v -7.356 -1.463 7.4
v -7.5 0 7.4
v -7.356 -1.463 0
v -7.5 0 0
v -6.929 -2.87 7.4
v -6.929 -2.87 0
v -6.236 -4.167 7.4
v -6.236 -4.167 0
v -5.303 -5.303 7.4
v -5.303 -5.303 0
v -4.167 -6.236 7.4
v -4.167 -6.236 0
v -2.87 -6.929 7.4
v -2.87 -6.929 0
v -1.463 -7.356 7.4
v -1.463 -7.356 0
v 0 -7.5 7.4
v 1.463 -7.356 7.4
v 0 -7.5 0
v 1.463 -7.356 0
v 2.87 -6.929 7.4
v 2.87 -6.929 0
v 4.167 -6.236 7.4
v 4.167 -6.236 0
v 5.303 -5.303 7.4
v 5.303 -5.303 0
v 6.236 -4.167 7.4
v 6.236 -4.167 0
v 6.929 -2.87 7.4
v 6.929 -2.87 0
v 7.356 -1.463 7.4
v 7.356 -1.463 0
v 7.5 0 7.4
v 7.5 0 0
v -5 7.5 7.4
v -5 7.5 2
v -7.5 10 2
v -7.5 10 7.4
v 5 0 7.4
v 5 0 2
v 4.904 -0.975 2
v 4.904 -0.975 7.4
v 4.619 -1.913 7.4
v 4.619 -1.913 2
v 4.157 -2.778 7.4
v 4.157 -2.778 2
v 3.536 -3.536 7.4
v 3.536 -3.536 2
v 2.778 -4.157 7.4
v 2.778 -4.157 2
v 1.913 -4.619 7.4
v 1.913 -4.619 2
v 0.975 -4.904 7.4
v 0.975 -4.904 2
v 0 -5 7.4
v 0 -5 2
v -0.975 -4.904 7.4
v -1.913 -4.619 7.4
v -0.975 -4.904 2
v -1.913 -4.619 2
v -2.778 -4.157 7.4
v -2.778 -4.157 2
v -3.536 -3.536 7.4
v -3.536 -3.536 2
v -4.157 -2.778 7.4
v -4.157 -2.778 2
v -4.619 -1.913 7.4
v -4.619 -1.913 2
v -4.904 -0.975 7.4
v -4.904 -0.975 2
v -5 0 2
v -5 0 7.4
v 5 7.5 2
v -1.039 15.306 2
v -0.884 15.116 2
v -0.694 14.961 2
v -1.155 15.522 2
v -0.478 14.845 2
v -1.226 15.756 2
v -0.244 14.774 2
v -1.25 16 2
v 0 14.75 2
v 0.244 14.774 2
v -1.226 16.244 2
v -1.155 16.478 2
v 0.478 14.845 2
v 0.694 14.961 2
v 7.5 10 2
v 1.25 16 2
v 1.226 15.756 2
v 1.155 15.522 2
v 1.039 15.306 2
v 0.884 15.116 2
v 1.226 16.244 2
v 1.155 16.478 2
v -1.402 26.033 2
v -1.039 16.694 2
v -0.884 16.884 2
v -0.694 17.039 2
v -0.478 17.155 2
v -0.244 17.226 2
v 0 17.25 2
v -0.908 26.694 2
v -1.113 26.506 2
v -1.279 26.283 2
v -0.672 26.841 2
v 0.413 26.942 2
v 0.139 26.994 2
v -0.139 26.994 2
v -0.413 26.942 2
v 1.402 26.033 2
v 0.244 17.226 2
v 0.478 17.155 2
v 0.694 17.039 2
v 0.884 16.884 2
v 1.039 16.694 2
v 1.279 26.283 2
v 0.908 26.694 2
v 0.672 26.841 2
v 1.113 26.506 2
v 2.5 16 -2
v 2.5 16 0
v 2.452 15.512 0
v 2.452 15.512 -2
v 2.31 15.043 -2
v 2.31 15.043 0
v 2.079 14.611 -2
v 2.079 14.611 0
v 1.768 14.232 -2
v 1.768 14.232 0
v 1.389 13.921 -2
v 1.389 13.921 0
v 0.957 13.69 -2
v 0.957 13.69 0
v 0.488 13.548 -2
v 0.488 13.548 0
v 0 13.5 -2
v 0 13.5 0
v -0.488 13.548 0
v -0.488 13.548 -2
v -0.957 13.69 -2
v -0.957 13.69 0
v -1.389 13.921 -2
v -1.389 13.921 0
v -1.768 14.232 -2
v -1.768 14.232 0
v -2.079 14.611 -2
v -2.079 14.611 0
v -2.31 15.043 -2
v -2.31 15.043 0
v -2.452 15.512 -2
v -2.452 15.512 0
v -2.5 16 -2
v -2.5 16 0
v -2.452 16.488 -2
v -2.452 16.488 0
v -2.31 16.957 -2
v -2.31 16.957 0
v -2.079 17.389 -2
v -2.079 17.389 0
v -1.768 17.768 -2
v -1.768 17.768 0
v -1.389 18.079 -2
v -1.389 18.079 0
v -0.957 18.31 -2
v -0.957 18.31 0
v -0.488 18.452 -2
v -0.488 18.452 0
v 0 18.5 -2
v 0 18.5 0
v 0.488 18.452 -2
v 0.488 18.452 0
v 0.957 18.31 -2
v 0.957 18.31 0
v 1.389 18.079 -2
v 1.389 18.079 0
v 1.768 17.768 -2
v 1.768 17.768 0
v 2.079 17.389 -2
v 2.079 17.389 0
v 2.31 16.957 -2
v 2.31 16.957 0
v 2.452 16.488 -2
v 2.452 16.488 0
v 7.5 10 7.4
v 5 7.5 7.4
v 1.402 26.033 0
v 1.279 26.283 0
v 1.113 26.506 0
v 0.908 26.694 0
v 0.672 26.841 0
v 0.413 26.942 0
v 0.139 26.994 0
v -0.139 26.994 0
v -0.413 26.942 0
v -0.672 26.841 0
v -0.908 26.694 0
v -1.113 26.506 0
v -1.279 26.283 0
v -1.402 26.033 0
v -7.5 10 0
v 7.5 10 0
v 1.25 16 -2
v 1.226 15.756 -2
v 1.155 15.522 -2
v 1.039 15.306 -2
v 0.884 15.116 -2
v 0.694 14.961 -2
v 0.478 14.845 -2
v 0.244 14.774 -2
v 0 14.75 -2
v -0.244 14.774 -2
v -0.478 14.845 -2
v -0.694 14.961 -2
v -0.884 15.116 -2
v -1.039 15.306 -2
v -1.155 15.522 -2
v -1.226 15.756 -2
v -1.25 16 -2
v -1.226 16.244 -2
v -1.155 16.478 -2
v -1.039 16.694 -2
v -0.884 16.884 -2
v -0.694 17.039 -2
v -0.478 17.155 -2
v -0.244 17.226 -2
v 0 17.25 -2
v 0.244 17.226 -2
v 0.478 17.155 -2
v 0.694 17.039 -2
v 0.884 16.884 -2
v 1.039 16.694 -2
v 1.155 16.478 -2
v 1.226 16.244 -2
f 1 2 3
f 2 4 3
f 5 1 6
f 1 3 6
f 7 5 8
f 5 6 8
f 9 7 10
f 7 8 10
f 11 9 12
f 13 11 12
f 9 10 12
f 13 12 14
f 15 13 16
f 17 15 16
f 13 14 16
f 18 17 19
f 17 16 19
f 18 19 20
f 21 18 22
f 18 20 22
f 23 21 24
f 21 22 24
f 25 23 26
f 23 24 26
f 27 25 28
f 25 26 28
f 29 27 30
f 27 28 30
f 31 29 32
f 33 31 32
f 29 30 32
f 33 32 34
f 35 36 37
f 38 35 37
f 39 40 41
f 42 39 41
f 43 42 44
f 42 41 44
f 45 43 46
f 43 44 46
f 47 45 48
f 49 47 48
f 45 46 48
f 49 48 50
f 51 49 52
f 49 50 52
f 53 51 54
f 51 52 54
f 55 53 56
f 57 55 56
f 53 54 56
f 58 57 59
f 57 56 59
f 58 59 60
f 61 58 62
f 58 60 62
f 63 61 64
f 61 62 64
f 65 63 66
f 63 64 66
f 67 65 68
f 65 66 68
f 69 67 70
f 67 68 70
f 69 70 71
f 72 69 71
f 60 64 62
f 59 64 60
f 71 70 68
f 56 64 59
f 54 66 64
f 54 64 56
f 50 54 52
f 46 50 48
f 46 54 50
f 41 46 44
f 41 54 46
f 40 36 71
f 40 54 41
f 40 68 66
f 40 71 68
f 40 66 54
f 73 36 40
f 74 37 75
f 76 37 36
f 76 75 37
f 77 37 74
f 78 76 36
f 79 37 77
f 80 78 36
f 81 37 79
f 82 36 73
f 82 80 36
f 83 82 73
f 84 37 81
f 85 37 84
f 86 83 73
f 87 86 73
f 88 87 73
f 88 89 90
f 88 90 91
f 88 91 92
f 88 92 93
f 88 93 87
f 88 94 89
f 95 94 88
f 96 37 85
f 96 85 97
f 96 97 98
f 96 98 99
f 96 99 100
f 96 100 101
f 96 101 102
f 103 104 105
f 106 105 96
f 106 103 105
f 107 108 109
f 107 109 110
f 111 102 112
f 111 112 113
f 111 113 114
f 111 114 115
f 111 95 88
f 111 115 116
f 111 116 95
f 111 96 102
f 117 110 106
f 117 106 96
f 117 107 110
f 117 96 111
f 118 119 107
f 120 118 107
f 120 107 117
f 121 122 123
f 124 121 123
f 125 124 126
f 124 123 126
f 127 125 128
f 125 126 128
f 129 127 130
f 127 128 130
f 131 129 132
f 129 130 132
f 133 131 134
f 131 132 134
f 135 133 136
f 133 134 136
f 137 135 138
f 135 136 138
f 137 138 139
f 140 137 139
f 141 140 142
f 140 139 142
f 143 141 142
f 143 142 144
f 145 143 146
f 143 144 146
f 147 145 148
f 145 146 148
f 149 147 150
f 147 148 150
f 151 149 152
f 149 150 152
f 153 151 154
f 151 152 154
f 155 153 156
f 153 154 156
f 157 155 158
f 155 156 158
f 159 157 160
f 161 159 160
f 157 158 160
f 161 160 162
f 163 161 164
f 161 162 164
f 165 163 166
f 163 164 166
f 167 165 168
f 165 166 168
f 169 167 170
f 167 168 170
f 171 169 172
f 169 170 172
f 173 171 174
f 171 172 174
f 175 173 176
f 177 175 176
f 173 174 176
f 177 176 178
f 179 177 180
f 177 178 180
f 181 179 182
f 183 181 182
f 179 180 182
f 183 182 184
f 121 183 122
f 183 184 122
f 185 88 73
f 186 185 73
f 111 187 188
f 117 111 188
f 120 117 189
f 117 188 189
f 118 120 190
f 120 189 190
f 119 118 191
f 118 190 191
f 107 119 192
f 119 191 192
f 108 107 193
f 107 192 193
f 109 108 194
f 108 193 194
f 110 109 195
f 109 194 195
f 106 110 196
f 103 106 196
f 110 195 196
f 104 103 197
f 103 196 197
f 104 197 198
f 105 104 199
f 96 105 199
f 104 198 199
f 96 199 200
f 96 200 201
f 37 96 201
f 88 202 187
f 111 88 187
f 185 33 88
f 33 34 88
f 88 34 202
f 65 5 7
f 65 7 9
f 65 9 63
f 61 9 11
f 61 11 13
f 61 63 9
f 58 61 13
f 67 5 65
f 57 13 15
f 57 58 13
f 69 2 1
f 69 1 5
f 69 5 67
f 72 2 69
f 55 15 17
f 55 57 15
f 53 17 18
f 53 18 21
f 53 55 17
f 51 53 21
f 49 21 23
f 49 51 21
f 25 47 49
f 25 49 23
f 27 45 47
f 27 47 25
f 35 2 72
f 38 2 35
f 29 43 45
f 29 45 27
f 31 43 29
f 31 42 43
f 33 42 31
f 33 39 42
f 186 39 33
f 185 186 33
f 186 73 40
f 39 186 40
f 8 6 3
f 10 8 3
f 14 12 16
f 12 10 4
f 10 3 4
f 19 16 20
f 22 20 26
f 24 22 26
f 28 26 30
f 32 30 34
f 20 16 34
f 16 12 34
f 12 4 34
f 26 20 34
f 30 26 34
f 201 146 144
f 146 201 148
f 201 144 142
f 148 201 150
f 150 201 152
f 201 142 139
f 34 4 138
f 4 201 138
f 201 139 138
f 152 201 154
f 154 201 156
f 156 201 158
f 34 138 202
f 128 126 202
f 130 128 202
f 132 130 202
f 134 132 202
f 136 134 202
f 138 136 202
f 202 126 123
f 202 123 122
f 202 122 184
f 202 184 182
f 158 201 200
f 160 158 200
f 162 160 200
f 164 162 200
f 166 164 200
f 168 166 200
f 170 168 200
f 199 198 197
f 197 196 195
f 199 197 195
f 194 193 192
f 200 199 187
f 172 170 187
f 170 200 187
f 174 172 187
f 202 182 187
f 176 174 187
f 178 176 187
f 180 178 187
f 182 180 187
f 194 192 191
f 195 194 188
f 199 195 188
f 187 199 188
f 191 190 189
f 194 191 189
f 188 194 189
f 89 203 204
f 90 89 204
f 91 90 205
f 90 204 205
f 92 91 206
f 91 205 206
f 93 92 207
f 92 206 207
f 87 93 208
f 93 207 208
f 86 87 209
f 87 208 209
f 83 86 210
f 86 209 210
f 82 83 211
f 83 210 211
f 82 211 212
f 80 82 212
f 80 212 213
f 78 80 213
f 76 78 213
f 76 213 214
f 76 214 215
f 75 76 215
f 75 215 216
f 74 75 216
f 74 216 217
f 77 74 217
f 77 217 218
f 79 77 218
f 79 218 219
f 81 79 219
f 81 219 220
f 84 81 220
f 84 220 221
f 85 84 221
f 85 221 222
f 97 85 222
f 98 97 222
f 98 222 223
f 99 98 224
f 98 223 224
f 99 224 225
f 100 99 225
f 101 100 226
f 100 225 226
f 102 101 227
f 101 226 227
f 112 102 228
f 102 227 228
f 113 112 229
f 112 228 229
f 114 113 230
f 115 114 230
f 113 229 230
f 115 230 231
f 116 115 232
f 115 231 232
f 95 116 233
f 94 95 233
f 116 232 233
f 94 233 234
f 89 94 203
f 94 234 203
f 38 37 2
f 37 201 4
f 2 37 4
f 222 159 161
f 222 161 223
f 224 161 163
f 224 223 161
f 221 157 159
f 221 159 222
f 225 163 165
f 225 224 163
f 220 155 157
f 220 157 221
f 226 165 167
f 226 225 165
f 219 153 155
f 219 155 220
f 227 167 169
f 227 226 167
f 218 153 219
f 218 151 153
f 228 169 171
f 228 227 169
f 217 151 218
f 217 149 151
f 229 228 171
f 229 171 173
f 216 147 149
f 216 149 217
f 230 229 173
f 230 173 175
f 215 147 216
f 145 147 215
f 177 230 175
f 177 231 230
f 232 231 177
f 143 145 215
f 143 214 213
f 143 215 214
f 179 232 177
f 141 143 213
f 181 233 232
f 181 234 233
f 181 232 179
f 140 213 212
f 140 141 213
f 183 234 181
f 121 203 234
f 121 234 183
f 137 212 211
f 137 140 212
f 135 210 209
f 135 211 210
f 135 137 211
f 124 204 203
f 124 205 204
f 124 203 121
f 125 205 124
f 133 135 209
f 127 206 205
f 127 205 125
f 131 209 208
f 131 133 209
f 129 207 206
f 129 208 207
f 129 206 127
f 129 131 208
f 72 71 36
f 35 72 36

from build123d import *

# Parameters (mm, degrees)
F1_DEPTH = 2
F3_DEPTH = 5.4
F4_R     = 2.5
F5_DEPTH = 2
F6_R     = 1.25
F7_DEPTH = 25


with BuildPart() as f1:
    # F0 (on Top) → F1 (new body)
    with BuildSketch(Plane.XY):
        with BuildLine():
            Line((-7.5, 10), (-7.5, 0))
            ThreePointArc((-7.5, 0), (0, -7.5), (7.5, 0))
            Line((7.5, 0), (7.5, 10))
            Line((7.5, 10), (1.40202, 26.033235))
            ThreePointArc((1.40202, 26.033235), (0, 27), (-1.40202, 26.033235))
            Line((-1.40202, 26.033235), (-7.5, 10))
        make_face()
    extrude(amount=F1_DEPTH)

    # F2 (on face) → F3 (join)
    with BuildSketch(Plane.XY.offset(2)):
        with BuildLine():
            Line((-7.5, 10), (-7.5, 0))
            ThreePointArc((-7.5, 0), (0, -7.5), (7.5, 0))
            Line((7.5, 0), (7.5, 10))
            Line((7.5, 10), (5, 7.5))
            Line((5, 7.5), (5, 0))
            ThreePointArc((5, 0), (0, -5), (-5, 0))
            Line((-5, 0), (-5, 7.5))
            Line((-5, 7.5), (-7.5, 10))
        make_face()
    extrude(amount=F3_DEPTH)

    # F4 (on face) → F5 (join)
    with BuildSketch(Plane(origin=(0, 0, 0), x_dir=(1, 0, 0), z_dir=(0, 0, -1))):
        with Locations((0, -16)):
            Circle(F4_R)
    extrude(amount=F5_DEPTH)

    # F6 (on face) → F7 (cut)
    with BuildSketch(Plane(origin=(0, 0, -2), x_dir=(1, 0, 0), z_dir=(0, 0, -1))):
        with Locations((0, -16)):
            Circle(F6_R)
    extrude(amount=-F7_DEPTH, mode=Mode.SUBTRACT)


solid = f1.part
